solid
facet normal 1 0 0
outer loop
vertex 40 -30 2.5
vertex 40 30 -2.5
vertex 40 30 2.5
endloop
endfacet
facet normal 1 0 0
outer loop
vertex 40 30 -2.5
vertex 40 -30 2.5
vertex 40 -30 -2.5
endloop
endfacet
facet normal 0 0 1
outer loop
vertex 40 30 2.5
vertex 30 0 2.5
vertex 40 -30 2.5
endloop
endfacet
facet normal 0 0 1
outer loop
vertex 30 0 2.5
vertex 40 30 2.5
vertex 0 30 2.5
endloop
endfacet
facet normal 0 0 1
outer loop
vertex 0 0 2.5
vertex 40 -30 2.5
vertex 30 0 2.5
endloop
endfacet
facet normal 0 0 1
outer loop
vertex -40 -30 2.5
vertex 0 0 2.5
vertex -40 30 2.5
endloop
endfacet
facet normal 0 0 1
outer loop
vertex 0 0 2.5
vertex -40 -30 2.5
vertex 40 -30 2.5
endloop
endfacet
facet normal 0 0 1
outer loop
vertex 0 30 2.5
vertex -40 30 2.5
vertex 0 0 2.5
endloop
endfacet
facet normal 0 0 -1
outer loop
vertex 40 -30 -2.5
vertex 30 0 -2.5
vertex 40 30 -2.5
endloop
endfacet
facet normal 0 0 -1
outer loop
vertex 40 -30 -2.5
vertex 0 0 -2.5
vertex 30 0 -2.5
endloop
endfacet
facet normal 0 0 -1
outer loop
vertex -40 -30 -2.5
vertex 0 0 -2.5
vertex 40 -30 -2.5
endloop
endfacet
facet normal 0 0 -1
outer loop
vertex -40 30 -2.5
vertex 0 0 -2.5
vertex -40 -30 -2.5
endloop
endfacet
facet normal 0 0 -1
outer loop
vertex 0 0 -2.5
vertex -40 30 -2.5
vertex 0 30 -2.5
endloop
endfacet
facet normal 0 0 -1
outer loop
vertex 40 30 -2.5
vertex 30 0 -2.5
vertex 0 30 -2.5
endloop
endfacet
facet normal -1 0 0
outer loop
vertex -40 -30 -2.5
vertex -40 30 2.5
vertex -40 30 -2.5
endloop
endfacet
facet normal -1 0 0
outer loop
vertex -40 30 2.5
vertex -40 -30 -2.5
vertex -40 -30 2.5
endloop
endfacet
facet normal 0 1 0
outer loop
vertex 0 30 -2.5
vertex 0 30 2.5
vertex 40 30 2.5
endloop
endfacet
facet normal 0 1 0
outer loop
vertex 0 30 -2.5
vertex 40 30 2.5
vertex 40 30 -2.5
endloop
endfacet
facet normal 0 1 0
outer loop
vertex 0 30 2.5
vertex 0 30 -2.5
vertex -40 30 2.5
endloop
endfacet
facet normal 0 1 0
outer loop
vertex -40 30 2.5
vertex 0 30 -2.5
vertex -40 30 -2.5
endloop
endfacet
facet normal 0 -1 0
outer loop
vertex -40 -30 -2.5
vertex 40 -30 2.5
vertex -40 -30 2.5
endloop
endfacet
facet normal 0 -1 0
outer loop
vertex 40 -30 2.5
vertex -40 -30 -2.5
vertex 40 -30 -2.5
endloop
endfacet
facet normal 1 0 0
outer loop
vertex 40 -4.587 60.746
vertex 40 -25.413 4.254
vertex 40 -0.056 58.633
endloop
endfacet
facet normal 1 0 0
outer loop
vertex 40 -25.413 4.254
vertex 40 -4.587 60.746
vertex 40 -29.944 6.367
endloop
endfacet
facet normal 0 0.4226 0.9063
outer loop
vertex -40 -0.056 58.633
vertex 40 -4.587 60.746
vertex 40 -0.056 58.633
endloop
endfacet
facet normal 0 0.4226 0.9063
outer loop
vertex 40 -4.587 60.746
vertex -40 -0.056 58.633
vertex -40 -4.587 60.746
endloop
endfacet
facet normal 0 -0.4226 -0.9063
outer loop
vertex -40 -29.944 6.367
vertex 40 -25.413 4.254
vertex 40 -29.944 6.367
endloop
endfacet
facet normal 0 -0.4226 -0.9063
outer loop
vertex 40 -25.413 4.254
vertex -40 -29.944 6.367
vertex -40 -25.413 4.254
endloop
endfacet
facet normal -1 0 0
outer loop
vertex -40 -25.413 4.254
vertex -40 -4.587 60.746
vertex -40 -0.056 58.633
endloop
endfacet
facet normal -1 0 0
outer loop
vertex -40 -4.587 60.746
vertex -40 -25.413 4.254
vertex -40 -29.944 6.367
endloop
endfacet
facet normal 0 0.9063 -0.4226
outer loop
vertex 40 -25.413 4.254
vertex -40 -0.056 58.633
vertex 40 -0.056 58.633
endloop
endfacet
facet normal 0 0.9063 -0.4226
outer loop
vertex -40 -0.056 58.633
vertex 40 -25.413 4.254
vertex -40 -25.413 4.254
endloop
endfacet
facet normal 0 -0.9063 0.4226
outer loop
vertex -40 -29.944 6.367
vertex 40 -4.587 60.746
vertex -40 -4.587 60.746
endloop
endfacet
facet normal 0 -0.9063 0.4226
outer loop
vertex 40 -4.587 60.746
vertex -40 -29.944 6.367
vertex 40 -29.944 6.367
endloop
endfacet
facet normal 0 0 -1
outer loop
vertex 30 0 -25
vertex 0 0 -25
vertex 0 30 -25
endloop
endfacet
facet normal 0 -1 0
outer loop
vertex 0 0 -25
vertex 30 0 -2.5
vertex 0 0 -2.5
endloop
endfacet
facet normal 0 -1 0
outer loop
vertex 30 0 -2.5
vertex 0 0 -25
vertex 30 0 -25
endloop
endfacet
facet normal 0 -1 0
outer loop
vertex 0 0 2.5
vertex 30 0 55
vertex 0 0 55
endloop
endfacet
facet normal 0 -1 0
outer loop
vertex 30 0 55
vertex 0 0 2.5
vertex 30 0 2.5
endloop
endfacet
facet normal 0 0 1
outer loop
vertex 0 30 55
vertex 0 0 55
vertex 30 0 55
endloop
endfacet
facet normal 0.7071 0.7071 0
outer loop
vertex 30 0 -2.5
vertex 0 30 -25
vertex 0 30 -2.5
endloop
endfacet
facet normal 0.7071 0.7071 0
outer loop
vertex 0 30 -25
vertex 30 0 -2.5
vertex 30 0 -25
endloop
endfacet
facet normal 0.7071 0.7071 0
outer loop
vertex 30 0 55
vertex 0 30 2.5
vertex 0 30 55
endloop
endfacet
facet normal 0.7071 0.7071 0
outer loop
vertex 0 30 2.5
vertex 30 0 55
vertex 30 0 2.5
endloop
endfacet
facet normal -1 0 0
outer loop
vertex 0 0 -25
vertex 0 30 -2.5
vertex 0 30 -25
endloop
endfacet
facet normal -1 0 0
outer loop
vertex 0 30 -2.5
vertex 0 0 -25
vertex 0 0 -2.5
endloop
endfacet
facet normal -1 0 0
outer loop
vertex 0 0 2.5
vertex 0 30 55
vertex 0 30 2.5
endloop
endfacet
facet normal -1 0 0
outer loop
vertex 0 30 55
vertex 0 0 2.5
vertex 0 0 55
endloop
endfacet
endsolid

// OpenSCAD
// Phone Stand
// Simple angled support design

// Parameters
base_length = 80;   // mm
base_width = 60;    // mm
base_height = 5;    // mm
back_height = 60;   // mm
angle = 65;         // degrees
$fn = 50;

// Base
cube([base_length, base_width, base_height], center=true);

// Angled back support
translate([0, -base_width/4, base_height/2 + back_height/2])
    rotate([angle-90, 0, 0])
        cube([base_length, base_height, back_height], center=true);

// Support triangle
translate([0, 0, base_height + 10])
    rotate([0, 0, 0])
        linear_extrude(height=base_length, center=true, twist=0)
            polygon(points=[[0,0], [30,0], [0,30]]);
